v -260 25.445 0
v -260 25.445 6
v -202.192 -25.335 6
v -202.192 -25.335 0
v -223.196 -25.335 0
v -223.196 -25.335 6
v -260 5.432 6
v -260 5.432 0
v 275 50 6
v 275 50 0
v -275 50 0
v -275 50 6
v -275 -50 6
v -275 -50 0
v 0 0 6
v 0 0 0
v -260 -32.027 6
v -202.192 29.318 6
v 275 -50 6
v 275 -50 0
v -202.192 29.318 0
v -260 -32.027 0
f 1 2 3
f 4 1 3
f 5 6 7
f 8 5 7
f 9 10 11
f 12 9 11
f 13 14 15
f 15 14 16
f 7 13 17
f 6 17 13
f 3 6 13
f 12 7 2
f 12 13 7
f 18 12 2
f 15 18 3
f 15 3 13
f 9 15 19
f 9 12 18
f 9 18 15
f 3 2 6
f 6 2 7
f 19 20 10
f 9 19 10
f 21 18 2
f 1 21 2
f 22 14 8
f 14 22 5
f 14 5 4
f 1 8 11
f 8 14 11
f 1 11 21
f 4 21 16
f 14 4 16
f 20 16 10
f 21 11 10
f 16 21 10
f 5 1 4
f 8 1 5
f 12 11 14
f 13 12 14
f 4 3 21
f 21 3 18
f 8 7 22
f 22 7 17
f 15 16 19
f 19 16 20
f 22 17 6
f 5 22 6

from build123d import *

# Parameters (mm, degrees)
F1_DEPTH = 6
F3_DEPTH = 25


with BuildPart() as f1:
    # F0 (on Top) → F1 (new body)
    with BuildSketch(Plane.XY):
        Polygon((275, -50), (275, 50), (-275, 50), (-275, -50), (0, 0), align=None)
    extrude(amount=F1_DEPTH)

    # F2 (on face) → F3 (cut)
    with BuildSketch(Plane.XY.offset(6)):
        Polygon((-223.195529, -25.335087), (-260, 5.431539), (-260, -32.026809), align=None)
        Polygon((-202.192262, 29.317927), (-260, 25.445178), (-202.192262, -25.335087), align=None)
    extrude(amount=-F3_DEPTH, mode=Mode.SUBTRACT)


solid = f1.part
